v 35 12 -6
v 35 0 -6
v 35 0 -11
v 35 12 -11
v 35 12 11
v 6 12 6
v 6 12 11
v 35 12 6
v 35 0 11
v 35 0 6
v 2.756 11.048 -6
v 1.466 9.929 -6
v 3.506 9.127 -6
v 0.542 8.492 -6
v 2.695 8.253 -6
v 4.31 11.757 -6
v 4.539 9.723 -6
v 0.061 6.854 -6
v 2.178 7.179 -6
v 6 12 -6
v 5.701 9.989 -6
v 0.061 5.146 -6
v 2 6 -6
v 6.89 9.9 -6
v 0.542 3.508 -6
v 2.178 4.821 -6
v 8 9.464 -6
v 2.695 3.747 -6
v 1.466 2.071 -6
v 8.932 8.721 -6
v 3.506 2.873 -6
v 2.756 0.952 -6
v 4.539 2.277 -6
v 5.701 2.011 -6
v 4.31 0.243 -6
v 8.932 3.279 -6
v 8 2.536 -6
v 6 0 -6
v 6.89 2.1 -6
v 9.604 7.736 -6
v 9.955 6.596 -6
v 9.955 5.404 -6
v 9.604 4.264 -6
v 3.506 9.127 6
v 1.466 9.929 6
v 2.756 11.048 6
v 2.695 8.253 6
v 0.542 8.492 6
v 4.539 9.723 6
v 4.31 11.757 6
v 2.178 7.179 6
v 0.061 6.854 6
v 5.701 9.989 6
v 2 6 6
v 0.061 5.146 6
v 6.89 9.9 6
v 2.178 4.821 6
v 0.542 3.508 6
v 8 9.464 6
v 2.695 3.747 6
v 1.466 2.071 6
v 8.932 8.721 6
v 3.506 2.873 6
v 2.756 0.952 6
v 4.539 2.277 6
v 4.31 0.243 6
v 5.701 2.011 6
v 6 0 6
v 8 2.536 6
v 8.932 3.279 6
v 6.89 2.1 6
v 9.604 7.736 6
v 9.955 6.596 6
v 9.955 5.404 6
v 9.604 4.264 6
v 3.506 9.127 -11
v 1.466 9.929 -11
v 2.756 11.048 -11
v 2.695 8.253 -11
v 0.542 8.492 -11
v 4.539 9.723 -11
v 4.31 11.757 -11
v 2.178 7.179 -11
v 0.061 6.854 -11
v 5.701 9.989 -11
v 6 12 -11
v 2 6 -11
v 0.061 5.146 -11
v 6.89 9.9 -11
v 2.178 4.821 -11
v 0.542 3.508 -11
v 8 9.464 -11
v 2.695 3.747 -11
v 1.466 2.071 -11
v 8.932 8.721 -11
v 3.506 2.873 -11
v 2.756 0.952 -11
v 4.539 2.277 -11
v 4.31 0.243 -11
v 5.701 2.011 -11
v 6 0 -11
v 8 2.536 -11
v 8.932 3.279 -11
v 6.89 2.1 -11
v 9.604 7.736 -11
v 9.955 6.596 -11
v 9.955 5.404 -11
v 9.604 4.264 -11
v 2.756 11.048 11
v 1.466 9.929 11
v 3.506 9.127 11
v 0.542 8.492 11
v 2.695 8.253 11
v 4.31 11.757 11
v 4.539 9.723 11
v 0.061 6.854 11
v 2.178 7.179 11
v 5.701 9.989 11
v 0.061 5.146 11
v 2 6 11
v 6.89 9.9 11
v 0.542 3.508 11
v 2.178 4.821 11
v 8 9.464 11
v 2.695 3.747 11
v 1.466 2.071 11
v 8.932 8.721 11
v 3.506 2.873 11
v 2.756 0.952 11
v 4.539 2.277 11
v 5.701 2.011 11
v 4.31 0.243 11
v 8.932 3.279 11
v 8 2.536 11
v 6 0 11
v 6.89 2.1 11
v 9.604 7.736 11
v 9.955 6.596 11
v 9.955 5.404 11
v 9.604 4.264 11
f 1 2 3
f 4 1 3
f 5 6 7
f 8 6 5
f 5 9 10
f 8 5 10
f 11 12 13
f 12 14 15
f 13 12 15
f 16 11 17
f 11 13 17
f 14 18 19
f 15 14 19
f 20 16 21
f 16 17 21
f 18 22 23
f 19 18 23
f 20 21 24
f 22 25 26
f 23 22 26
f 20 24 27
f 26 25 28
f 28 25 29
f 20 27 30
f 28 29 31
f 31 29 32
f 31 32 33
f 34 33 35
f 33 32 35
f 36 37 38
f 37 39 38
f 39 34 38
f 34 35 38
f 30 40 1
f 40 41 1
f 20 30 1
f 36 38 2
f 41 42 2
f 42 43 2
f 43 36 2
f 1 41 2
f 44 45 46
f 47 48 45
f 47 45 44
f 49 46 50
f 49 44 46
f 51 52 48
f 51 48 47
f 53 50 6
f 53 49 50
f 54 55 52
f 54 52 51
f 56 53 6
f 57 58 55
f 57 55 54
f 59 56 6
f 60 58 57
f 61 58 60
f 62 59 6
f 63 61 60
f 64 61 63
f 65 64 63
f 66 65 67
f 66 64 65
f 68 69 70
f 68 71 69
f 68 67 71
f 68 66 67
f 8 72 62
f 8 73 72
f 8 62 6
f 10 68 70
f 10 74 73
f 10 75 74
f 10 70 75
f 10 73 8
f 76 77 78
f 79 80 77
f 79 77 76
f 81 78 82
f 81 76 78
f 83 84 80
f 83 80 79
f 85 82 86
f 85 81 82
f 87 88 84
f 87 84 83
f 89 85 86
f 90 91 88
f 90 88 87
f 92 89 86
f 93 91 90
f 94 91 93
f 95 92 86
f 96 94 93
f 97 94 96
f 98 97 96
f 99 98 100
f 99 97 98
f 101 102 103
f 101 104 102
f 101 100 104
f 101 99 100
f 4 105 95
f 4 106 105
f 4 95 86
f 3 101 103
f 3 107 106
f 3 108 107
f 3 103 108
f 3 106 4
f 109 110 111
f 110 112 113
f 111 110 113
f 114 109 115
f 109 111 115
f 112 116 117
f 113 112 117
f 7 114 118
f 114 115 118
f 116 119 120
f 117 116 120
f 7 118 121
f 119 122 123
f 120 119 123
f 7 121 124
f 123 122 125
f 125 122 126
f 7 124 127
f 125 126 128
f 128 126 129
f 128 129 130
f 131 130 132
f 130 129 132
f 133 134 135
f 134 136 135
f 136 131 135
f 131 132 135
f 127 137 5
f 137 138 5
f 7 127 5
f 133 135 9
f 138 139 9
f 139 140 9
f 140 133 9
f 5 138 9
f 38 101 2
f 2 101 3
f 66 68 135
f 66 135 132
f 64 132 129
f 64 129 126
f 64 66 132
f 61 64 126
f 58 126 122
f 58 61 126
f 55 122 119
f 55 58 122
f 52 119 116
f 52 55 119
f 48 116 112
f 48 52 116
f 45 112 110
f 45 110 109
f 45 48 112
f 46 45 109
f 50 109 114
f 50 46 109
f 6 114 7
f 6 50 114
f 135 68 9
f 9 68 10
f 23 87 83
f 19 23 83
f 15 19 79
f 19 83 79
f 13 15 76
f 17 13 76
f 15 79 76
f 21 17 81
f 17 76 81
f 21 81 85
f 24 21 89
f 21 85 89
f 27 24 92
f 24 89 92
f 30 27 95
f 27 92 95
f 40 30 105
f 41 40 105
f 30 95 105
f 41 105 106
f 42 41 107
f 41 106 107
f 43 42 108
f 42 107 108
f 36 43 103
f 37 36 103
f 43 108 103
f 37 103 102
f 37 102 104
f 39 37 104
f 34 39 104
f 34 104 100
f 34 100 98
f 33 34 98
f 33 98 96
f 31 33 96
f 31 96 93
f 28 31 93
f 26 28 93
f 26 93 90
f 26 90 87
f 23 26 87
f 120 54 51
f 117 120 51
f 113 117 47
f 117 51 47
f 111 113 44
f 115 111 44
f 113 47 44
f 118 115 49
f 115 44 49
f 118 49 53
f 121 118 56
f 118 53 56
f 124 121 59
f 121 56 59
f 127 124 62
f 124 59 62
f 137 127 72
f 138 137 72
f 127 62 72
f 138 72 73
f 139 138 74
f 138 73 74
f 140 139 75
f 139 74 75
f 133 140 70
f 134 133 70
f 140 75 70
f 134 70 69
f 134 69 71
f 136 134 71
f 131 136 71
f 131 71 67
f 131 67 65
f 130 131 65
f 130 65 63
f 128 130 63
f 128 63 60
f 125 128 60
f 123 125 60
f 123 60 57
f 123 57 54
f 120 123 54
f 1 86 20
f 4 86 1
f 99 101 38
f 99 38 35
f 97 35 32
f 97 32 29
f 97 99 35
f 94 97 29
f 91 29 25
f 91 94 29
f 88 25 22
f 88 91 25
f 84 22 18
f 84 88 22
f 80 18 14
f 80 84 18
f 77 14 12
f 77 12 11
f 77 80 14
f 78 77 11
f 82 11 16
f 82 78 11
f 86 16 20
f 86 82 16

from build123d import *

# Parameters (mm, degrees)
SKETCH7_W             = 35
SKETCH7_H             = 5
BOSS_EXTRUDE3_DEPTH   = 12
BOSS_EXTRUDE3_2_DEPTH = 12
CUT_EXTRUDE9_DEPTH    = 22
SKETCH9_R             = 4
CUT_EXTRUDE10_DEPTH   = 22


with BuildPart() as part:
    # Sketch7 → Boss-Extrude3 (new body)
    with BuildSketch(Plane(origin=(0, 0, 0), x_dir=(1, 0, 0), z_dir=(0, 1, 0))):
        with Locations((17.5, 8.5)):
            Rectangle(SKETCH7_W, SKETCH7_H)
    extrude(amount=BOSS_EXTRUDE3_DEPTH)


with BuildPart() as body_2:
    # Sketch7 → Boss-Extrude3 2 (new body)
    with BuildSketch(Plane(origin=(0, 0, 0), x_dir=(1, 0, 0), z_dir=(0, 1, 0))):
        with Locations((17.5, -8.5)):
            Rectangle(SKETCH7_W, SKETCH7_H)
    extrude(amount=BOSS_EXTRUDE3_2_DEPTH)


with BuildPart() as cut_extrude9_tool:
    # Sketch8 → Cut-Extrude9 (new body)
    with BuildSketch(Plane(origin=(0, 0, -11), x_dir=(-1, 0, 0), z_dir=(0, 0, -1))):
        with BuildLine():
            Line((-6, 12), (6.269101311, 12))
            Line((6.269101311, 12), (6.269101311, 0))
            Line((6.269101311, 0), (-6, 0))
            ThreePointArc((-6, 0), (0, 6), (-6, 12))
        make_face()
    extrude(amount=-CUT_EXTRUDE9_DEPTH)


with BuildPart() as part_1:
    add(part.part)

    # Cut-Extrude9: cut by cut_extrude9_tool
    add(cut_extrude9_tool.part, mode=Mode.SUBTRACT)


with BuildPart() as body_2_1:
    add(body_2.part)

    # Cut-Extrude9: cut by cut_extrude9_tool
    add(cut_extrude9_tool.part, mode=Mode.SUBTRACT)


with BuildPart() as cut_extrude10_tool:
    # Sketch9 → Cut-Extrude10 (new body)
    with BuildSketch(Plane(origin=(0, 0, -11), x_dir=(-1, 0, 0), z_dir=(0, 0, -1))):
        with Locations((-6, 6)):
            Circle(SKETCH9_R)
    extrude(amount=-CUT_EXTRUDE10_DEPTH)


with BuildPart() as part_2:
    add(part_1.part)

    # Cut-Extrude10: cut by cut_extrude10_tool
    add(cut_extrude10_tool.part, mode=Mode.SUBTRACT)


with BuildPart() as body_2_2:
    add(body_2_1.part)

    # Cut-Extrude10: cut by cut_extrude10_tool
    add(cut_extrude10_tool.part, mode=Mode.SUBTRACT)


solid = Compound([part_2.part, body_2_2.part])
